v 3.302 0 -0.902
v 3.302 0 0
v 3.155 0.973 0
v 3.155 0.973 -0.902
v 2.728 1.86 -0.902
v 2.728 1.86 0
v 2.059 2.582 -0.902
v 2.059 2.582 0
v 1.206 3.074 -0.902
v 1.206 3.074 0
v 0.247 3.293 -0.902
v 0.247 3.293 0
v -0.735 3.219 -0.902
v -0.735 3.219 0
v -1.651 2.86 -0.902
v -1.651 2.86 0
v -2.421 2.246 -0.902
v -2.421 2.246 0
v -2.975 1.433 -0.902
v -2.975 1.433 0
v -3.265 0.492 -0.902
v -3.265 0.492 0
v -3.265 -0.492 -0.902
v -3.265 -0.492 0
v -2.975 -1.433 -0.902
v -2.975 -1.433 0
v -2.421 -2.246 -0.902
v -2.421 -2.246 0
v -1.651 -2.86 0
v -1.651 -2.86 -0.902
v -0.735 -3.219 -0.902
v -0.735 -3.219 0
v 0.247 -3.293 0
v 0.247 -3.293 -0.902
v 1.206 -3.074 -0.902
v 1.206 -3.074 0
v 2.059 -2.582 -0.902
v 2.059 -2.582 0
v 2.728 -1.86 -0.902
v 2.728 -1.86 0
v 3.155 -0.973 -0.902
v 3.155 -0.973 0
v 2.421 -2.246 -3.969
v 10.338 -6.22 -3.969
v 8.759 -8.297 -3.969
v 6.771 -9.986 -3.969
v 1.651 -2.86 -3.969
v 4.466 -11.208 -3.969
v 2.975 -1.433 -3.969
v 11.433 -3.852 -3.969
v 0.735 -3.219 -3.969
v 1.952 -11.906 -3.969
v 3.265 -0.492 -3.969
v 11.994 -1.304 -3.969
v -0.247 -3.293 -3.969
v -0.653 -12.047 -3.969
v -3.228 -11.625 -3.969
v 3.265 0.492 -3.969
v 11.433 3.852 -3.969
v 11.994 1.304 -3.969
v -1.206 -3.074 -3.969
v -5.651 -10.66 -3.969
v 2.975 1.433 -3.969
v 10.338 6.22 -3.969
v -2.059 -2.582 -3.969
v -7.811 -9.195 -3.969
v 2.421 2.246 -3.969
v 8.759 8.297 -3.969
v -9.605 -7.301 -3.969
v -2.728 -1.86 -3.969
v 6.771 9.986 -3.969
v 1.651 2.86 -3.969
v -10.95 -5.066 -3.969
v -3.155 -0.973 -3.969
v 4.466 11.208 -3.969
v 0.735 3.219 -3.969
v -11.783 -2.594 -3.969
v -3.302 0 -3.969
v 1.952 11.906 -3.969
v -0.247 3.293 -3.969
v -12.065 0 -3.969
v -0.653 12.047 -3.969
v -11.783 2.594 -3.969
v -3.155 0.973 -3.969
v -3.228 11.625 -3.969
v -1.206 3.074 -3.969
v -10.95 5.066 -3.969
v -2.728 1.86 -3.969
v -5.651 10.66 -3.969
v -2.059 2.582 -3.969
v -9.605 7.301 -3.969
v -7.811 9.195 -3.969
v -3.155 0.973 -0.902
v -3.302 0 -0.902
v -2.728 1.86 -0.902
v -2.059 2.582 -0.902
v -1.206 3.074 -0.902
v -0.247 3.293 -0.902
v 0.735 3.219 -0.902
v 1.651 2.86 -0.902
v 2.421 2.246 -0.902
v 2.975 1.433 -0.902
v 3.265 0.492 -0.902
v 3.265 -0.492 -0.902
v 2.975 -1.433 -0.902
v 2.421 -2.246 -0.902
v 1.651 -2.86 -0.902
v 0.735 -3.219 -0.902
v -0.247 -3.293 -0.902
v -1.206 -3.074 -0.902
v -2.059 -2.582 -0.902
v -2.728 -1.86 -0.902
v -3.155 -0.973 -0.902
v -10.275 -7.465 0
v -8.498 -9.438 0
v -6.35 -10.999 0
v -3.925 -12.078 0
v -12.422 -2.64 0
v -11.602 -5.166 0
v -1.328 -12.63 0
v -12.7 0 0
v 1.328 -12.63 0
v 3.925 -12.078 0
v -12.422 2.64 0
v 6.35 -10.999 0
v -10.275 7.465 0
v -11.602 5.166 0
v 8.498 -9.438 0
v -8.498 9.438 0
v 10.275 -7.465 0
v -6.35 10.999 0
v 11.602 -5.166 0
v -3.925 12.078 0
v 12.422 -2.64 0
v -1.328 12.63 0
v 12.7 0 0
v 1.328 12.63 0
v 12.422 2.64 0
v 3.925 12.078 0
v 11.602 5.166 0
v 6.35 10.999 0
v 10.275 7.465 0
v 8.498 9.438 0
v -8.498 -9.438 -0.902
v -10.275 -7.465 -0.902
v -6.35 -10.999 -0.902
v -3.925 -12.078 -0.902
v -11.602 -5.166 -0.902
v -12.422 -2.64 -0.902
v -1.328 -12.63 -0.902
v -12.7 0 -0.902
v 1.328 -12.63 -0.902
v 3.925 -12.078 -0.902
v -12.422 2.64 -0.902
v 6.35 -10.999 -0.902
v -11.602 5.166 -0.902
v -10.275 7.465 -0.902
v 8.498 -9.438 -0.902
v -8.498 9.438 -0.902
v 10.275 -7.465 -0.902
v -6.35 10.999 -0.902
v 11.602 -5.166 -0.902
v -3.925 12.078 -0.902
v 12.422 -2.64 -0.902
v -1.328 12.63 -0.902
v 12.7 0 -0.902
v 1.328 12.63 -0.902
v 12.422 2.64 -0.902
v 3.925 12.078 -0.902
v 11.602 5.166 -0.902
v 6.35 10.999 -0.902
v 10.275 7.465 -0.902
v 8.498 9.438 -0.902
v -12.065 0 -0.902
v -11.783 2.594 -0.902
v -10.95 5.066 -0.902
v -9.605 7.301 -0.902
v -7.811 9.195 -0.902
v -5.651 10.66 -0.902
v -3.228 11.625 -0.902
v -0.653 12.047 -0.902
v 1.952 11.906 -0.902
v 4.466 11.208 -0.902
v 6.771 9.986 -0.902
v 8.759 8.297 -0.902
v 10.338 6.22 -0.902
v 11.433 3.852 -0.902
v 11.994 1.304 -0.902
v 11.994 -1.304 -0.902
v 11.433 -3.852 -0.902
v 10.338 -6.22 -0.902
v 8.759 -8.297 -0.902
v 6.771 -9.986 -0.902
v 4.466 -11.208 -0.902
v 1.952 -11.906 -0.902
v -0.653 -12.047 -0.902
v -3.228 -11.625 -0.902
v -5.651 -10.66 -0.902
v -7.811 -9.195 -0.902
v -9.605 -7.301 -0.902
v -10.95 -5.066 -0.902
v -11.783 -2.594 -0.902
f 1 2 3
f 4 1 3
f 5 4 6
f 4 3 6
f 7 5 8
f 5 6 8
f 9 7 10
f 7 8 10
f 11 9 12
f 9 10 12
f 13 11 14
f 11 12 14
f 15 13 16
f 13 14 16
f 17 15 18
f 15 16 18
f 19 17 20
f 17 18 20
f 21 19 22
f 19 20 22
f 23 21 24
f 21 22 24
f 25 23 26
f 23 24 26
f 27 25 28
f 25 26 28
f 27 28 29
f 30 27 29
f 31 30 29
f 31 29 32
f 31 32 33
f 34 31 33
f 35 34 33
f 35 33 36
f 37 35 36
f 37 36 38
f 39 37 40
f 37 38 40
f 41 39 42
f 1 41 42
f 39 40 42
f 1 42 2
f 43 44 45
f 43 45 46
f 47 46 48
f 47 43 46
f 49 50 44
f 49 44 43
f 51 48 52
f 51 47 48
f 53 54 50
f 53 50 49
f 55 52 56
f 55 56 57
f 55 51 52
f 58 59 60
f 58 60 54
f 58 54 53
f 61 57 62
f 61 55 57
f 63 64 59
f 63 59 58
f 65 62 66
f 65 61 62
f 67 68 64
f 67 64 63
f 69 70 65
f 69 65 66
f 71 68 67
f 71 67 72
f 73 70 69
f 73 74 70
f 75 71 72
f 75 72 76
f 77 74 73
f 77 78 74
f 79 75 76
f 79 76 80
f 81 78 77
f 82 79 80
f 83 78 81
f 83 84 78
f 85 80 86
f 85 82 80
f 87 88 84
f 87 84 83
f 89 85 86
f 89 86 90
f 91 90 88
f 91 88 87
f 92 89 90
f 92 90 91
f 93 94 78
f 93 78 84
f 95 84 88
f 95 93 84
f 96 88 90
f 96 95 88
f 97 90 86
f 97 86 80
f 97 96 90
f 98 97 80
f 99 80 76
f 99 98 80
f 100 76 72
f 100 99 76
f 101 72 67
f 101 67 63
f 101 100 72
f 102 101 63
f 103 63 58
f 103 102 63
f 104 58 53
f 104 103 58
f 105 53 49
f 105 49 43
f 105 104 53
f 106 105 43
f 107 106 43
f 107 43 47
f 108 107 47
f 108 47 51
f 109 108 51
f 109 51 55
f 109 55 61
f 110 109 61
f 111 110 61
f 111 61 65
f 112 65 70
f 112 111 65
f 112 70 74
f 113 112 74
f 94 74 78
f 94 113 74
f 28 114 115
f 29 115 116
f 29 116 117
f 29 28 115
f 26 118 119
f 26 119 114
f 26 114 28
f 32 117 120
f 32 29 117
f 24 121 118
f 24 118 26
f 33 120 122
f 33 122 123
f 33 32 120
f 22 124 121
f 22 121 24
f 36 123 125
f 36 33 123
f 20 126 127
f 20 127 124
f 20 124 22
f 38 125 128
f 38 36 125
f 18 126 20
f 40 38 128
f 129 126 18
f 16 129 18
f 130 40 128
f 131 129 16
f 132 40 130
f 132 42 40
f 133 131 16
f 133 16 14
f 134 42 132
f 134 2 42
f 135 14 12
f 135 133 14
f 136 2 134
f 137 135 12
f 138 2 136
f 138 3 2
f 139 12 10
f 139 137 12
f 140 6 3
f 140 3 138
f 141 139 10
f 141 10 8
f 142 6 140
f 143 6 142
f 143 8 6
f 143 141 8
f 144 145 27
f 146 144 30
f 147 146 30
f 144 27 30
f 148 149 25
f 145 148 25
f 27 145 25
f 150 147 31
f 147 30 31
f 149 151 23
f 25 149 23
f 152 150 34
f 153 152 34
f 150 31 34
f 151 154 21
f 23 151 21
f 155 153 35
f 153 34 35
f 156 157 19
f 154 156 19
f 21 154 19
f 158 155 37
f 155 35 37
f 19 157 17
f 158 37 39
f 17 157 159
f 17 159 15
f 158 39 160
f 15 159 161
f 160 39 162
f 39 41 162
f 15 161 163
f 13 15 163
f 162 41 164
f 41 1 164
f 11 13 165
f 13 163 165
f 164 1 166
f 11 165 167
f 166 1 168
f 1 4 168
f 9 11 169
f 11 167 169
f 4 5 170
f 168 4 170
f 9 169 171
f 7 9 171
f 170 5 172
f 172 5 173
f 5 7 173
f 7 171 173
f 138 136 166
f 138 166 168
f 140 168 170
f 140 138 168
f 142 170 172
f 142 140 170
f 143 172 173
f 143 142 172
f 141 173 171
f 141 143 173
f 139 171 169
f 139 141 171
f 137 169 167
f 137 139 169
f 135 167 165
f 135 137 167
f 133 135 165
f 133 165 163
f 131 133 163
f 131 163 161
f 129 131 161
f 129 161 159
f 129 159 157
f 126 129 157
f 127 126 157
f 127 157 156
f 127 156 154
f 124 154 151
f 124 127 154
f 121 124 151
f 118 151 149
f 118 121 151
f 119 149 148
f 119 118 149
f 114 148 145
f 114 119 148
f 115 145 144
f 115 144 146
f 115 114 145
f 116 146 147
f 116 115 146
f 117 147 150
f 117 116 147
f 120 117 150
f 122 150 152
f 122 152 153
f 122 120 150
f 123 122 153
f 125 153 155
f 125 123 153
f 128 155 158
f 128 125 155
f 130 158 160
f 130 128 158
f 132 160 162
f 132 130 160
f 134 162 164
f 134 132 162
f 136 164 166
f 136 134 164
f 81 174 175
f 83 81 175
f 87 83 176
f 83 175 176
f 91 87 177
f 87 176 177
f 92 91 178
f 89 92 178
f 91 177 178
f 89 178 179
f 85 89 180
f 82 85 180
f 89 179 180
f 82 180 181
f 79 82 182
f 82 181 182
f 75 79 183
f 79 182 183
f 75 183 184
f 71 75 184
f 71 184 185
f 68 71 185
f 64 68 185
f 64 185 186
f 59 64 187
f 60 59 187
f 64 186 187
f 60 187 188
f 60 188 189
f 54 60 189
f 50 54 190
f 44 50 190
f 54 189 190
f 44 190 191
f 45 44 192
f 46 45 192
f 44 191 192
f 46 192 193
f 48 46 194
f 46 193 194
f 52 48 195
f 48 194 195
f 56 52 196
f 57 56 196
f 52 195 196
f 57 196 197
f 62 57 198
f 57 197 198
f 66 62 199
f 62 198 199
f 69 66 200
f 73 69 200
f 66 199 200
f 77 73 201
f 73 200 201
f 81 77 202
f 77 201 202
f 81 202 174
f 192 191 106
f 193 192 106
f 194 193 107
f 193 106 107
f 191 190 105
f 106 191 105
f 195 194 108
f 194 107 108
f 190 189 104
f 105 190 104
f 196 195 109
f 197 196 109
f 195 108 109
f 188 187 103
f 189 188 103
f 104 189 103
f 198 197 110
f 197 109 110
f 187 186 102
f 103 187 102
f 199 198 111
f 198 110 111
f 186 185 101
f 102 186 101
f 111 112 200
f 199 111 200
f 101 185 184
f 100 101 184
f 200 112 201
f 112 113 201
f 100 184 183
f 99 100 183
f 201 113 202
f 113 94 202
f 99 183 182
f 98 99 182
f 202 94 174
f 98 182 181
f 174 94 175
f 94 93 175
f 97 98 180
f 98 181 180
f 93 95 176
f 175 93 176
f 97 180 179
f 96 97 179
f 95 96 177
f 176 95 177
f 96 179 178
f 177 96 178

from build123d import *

# Parameters (mm, degrees)
SKETCH1_R      = 12.7
SKETCH1_R_2    = 3.302
EXTRUDE1_DEPTH = 0.9017
SKETCH2_R      = 12.065
SKETCH2_R_2    = 3.302
EXTRUDE2_DEPTH = 3.06705


with BuildPart() as part:
    # Sketch1 → Extrude1 (new body)
    with BuildSketch(Plane.XY):
        Circle(SKETCH1_R)
        Circle(SKETCH1_R_2, mode=Mode.SUBTRACT)
    extrude(amount=-EXTRUDE1_DEPTH)


with BuildPart() as body_2:
    # Sketch2 → Extrude2 (new body)
    with BuildSketch(Plane(origin=(0, 0, -0.9017), x_dir=(-1, 0, 0), z_dir=(0, 0, -1))):
        Circle(SKETCH2_R)
        Circle(SKETCH2_R_2, mode=Mode.SUBTRACT)
    extrude(amount=EXTRUDE2_DEPTH)


solid = Compound([part.part, body_2.part])
